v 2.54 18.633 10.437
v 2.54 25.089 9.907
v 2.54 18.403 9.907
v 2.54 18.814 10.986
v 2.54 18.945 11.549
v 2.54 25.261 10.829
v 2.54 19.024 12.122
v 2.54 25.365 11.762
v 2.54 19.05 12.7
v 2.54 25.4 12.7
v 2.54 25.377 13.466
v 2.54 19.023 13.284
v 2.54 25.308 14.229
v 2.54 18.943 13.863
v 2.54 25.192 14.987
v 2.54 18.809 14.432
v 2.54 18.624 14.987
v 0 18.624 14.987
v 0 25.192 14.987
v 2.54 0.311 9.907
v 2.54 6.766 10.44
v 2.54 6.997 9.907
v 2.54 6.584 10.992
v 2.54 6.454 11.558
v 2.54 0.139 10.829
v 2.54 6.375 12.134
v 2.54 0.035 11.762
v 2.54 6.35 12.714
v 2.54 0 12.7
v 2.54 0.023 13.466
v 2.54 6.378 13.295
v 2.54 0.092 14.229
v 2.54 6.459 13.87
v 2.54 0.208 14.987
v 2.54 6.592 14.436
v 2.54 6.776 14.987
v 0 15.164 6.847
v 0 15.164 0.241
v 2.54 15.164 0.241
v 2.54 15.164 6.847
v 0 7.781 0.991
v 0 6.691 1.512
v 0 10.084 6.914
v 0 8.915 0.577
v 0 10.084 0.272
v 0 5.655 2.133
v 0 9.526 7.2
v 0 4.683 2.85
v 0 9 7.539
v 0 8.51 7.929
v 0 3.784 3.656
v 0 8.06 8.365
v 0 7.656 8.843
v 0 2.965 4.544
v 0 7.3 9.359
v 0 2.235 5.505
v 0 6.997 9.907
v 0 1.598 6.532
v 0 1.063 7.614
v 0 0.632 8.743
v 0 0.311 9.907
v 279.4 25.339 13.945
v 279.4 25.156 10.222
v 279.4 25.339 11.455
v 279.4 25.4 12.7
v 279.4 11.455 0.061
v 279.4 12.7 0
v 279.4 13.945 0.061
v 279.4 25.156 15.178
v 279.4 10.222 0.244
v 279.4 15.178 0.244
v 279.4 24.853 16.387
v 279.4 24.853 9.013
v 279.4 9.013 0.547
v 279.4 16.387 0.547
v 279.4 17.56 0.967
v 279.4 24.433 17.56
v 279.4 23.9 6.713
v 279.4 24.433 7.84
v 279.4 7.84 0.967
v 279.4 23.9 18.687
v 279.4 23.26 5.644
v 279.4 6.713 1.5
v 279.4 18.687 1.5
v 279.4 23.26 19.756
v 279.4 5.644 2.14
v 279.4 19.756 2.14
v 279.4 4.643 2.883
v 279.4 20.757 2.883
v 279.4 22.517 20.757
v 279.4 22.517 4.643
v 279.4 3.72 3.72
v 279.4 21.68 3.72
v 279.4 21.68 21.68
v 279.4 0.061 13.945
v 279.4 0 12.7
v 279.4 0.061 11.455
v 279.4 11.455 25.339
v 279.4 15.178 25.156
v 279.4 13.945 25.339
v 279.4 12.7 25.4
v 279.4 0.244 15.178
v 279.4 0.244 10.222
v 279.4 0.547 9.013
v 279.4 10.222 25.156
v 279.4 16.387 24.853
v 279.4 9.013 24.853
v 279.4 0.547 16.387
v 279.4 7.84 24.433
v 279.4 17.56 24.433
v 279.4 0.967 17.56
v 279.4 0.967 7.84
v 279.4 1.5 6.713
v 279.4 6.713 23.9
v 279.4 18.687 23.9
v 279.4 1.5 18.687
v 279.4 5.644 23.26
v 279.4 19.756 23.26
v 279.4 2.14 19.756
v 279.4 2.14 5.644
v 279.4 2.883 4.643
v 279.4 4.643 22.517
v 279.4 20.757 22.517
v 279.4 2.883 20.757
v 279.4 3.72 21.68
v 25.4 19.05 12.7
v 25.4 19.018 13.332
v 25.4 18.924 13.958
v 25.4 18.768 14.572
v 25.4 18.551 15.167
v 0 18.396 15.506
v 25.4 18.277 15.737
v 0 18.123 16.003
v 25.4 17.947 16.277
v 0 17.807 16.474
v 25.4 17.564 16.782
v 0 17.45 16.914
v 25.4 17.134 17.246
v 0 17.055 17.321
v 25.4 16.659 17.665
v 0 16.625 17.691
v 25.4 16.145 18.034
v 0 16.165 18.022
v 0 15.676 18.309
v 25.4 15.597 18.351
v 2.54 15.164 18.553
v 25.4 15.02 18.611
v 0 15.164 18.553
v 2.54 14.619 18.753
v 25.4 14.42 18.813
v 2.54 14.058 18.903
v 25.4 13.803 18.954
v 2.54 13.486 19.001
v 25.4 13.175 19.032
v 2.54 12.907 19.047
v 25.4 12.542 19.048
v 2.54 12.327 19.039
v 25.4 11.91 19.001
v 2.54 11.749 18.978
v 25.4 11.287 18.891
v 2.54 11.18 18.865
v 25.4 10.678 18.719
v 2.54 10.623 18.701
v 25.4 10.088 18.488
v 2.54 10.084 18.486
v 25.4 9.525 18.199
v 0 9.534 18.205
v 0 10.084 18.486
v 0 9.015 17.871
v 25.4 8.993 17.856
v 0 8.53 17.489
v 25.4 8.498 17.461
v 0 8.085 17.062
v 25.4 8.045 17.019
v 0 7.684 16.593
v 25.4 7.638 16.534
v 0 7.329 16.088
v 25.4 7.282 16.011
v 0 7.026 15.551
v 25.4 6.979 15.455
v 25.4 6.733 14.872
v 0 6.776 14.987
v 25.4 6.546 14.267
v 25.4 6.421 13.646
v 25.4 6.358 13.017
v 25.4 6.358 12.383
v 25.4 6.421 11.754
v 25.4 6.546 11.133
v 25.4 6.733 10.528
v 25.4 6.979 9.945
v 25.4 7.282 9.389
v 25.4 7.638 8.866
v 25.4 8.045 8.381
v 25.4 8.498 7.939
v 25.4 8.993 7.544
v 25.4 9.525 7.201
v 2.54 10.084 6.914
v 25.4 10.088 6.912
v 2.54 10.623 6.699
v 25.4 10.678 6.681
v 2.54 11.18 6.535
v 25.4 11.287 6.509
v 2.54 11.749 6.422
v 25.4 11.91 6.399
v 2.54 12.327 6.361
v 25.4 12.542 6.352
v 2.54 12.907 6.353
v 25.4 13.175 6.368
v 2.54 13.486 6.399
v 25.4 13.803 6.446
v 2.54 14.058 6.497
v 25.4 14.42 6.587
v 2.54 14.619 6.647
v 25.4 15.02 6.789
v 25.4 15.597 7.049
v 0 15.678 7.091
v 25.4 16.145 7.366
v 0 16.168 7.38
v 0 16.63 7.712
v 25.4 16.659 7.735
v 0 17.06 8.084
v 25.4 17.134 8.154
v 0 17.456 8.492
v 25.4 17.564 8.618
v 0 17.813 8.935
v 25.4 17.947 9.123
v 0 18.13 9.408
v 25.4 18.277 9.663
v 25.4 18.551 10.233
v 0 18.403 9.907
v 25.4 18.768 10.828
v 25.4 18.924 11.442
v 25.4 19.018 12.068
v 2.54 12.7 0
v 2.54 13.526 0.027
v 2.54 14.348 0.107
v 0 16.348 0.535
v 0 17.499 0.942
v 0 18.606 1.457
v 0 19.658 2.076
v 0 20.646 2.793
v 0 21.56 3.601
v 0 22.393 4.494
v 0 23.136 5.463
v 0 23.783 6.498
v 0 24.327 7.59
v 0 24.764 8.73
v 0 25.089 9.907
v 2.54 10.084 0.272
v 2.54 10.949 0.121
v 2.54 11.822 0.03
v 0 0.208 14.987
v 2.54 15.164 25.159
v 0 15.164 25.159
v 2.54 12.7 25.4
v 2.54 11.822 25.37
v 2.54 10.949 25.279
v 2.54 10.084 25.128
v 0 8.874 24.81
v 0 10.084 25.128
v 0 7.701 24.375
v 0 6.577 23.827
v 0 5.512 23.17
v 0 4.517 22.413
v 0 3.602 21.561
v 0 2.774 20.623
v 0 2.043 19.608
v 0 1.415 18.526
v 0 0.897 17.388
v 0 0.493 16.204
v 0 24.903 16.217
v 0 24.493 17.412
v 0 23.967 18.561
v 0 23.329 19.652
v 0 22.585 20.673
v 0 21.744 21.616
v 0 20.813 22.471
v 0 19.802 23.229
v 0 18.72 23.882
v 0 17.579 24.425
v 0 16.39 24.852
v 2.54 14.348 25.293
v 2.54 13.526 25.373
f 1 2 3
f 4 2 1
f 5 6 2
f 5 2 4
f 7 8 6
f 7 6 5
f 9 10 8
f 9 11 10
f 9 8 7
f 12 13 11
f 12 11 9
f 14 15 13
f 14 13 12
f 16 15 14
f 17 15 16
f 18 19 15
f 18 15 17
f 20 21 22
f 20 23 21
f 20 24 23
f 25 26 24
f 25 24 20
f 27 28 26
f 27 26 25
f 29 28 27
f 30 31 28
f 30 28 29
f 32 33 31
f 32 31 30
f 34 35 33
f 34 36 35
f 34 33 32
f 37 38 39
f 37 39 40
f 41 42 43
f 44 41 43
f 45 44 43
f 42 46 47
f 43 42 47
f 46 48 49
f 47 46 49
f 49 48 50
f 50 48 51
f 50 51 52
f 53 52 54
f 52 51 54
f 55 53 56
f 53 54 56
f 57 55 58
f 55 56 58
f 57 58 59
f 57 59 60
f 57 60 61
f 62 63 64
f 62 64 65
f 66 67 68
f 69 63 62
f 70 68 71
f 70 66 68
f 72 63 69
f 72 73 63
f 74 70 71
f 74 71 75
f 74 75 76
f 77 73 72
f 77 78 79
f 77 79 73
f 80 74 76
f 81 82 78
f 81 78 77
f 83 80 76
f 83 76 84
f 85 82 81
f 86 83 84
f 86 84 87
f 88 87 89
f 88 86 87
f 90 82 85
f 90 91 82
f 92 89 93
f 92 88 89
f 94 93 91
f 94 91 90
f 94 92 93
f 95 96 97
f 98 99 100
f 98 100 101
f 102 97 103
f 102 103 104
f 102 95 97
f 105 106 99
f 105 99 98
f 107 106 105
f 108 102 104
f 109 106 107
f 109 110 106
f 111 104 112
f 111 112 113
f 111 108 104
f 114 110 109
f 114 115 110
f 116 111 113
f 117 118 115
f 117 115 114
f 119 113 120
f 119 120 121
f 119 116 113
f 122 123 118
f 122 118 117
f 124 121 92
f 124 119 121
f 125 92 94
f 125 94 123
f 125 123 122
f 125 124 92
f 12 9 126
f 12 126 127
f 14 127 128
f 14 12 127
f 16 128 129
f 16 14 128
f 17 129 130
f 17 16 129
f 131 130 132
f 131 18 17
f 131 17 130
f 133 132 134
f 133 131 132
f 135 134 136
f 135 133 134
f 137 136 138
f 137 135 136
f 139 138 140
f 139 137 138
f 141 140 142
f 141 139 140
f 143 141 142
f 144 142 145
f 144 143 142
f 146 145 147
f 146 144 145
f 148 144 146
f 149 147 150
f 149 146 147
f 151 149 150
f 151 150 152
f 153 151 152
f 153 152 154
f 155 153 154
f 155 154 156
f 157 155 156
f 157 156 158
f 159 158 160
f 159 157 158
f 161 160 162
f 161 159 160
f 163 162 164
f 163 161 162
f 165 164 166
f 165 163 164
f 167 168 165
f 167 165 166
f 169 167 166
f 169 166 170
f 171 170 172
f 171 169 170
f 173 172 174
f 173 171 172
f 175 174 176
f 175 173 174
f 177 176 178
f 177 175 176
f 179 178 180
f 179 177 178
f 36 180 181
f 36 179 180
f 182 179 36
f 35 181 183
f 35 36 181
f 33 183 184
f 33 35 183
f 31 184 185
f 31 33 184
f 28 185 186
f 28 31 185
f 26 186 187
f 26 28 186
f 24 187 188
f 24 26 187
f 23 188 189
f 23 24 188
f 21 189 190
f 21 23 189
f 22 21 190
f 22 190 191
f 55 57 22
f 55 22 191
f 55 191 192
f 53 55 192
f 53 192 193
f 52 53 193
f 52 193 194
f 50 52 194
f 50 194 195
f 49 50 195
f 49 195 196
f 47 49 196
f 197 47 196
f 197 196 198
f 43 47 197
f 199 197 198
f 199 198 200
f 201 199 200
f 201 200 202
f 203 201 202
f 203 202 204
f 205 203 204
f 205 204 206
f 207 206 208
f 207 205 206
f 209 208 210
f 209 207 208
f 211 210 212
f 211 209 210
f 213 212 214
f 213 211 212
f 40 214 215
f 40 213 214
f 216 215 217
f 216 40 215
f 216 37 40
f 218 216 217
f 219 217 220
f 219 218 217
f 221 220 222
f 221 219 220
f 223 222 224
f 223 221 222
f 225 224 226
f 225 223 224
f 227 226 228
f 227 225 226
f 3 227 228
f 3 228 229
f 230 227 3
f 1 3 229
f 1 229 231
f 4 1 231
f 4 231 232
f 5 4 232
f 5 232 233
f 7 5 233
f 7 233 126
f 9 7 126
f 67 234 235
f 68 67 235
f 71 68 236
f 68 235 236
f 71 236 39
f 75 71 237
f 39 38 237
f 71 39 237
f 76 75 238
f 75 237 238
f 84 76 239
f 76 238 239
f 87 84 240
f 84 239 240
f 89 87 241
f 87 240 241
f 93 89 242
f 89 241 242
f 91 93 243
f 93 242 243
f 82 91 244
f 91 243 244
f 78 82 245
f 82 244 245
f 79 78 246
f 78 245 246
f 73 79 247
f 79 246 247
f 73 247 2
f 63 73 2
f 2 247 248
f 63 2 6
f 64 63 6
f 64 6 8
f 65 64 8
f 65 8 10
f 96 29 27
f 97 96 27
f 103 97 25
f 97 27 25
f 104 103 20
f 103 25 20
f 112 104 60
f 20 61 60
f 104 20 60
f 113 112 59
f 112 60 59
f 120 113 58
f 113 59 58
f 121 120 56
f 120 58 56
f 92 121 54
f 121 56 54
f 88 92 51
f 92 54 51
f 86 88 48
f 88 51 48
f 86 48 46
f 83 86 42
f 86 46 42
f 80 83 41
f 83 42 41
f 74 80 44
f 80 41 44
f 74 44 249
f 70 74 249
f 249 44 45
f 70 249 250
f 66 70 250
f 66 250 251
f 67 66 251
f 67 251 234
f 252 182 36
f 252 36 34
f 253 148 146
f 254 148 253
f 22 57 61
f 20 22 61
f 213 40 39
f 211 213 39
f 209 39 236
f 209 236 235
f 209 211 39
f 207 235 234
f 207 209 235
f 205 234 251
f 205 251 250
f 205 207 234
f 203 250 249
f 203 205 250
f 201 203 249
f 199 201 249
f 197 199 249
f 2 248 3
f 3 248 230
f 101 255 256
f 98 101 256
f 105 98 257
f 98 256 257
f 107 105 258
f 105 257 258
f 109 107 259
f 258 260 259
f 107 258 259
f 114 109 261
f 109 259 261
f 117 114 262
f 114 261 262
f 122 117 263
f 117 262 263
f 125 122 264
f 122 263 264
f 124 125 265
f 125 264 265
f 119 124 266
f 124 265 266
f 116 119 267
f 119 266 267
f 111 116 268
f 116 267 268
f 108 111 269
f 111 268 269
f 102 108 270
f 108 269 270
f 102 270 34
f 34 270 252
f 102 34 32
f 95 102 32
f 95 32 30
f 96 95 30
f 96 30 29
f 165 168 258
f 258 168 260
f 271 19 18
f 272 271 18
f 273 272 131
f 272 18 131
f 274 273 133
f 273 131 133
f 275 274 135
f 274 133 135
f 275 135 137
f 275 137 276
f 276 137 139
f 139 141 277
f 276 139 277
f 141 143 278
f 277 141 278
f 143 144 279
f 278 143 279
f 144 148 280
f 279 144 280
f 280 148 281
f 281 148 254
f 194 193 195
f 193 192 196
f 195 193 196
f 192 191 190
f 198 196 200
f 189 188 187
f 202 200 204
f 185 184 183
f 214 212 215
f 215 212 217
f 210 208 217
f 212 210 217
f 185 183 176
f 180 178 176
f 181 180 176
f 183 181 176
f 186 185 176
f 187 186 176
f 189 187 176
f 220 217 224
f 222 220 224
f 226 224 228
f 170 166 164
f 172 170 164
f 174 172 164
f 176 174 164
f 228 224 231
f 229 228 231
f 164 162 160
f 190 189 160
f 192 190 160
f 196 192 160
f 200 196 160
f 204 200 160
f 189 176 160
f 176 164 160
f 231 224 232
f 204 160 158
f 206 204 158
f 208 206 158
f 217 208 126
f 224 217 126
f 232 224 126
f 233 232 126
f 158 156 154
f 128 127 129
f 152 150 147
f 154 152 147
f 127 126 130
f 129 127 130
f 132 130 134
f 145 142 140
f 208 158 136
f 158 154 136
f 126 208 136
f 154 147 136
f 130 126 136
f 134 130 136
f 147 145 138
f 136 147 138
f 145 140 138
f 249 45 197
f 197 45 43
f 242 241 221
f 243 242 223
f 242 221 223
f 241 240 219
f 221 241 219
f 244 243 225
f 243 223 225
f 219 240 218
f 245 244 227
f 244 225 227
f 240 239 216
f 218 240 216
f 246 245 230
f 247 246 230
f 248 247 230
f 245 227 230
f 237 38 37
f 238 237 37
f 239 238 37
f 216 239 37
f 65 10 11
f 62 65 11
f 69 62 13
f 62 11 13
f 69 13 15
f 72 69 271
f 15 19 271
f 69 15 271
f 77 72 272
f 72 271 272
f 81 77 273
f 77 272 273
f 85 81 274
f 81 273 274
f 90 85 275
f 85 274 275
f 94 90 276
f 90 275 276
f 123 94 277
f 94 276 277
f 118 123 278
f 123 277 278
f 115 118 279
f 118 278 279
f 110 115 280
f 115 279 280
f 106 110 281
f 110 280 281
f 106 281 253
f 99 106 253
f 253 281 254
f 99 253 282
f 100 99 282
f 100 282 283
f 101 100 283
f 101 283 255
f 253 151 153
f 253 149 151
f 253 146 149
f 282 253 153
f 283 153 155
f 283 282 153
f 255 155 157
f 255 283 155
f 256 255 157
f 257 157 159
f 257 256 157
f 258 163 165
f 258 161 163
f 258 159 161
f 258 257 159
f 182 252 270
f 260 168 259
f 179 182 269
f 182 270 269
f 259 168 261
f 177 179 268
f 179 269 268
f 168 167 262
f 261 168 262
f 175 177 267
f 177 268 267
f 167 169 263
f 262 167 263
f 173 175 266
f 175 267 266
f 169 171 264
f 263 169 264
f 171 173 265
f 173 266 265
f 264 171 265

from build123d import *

# Parameters (mm, degrees)
F0_W     = 279.4
F0_H     = 25.4
F1_DEPTH = 25.4
F3_DEPTH = 279.4
F4_R     = 6.35
F5_DEPTH = 25.4
F6_W     = 5.08
F6_H     = 20.8788
F6_W_2   = 46.6979
F6_H_2   = 5.08
F7_DEPTH = 2.54


with BuildPart() as f1:
    # F0 (on Front) → F1 (new body)
    with BuildSketch(Plane.XZ):
        with Locations((139.7, 12.7)):
            Rectangle(F0_W, F0_H)
    extrude(amount=-F1_DEPTH)

    # F2 (on face) → F3 (cut)
    with BuildSketch(Plane(origin=(0, 0, 0), x_dir=(0, -1, 0), z_dir=(-1, 0, 0))):
        with BuildLine():
            Line((0, 0), (0, 12.7))
            ThreePointArc((0, 12.7), (-3.719744, 3.719744), (-12.7, 0))
            Line((-12.7, 0), (0, 0))
        make_face()
        with BuildLine():
            Line((-25.4, 0), (-12.7, 0))
            ThreePointArc((-12.7, 0), (-21.680256, 3.719744), (-25.4, 12.7))
            Line((-25.4, 12.7), (-25.4, 0))
        make_face()
        with BuildLine():
            ThreePointArc((-25.4, 12.7), (-21.680256, 21.680256), (-12.7, 25.4))
            Line((-12.7, 25.4), (-25.4, 25.4))
            Line((-25.4, 25.4), (-25.4, 12.7))
        make_face()
        with BuildLine():
            ThreePointArc((-12.7, 25.4), (-3.719744, 21.680256), (0, 12.7))
            Line((0, 12.7), (0, 25.4))
            Line((0, 25.4), (-12.7, 25.4))
        make_face()
    extrude(amount=-F3_DEPTH, mode=Mode.SUBTRACT)

    # F4 (on Right) → F5 (cut)
    with BuildSketch(Plane.YZ):
        with Locations((12.7, 12.7)):
            Circle(F4_R)
    extrude(amount=F5_DEPTH, mode=Mode.SUBTRACT)

    # F6 (on face) → F7 (cut)
    with BuildSketch(Plane(origin=(0, 0, 0), x_dir=(0, -1, 0), z_dir=(-1, 0, 0))):
        with Locations((-12.623682, 25.426102)):
            Rectangle(F6_W, F6_H)
        with Locations((13.265268, 12.446702)):
            Rectangle(F6_W_2, F6_H_2)
        with Locations((-38.512632, 12.446702)):
            Rectangle(F6_W_2, F6_H_2)
        with Locations((-12.623682, -0.532698)):
            Rectangle(F6_W, F6_H)
    extrude(amount=-F7_DEPTH, mode=Mode.SUBTRACT)


solid = f1.part
